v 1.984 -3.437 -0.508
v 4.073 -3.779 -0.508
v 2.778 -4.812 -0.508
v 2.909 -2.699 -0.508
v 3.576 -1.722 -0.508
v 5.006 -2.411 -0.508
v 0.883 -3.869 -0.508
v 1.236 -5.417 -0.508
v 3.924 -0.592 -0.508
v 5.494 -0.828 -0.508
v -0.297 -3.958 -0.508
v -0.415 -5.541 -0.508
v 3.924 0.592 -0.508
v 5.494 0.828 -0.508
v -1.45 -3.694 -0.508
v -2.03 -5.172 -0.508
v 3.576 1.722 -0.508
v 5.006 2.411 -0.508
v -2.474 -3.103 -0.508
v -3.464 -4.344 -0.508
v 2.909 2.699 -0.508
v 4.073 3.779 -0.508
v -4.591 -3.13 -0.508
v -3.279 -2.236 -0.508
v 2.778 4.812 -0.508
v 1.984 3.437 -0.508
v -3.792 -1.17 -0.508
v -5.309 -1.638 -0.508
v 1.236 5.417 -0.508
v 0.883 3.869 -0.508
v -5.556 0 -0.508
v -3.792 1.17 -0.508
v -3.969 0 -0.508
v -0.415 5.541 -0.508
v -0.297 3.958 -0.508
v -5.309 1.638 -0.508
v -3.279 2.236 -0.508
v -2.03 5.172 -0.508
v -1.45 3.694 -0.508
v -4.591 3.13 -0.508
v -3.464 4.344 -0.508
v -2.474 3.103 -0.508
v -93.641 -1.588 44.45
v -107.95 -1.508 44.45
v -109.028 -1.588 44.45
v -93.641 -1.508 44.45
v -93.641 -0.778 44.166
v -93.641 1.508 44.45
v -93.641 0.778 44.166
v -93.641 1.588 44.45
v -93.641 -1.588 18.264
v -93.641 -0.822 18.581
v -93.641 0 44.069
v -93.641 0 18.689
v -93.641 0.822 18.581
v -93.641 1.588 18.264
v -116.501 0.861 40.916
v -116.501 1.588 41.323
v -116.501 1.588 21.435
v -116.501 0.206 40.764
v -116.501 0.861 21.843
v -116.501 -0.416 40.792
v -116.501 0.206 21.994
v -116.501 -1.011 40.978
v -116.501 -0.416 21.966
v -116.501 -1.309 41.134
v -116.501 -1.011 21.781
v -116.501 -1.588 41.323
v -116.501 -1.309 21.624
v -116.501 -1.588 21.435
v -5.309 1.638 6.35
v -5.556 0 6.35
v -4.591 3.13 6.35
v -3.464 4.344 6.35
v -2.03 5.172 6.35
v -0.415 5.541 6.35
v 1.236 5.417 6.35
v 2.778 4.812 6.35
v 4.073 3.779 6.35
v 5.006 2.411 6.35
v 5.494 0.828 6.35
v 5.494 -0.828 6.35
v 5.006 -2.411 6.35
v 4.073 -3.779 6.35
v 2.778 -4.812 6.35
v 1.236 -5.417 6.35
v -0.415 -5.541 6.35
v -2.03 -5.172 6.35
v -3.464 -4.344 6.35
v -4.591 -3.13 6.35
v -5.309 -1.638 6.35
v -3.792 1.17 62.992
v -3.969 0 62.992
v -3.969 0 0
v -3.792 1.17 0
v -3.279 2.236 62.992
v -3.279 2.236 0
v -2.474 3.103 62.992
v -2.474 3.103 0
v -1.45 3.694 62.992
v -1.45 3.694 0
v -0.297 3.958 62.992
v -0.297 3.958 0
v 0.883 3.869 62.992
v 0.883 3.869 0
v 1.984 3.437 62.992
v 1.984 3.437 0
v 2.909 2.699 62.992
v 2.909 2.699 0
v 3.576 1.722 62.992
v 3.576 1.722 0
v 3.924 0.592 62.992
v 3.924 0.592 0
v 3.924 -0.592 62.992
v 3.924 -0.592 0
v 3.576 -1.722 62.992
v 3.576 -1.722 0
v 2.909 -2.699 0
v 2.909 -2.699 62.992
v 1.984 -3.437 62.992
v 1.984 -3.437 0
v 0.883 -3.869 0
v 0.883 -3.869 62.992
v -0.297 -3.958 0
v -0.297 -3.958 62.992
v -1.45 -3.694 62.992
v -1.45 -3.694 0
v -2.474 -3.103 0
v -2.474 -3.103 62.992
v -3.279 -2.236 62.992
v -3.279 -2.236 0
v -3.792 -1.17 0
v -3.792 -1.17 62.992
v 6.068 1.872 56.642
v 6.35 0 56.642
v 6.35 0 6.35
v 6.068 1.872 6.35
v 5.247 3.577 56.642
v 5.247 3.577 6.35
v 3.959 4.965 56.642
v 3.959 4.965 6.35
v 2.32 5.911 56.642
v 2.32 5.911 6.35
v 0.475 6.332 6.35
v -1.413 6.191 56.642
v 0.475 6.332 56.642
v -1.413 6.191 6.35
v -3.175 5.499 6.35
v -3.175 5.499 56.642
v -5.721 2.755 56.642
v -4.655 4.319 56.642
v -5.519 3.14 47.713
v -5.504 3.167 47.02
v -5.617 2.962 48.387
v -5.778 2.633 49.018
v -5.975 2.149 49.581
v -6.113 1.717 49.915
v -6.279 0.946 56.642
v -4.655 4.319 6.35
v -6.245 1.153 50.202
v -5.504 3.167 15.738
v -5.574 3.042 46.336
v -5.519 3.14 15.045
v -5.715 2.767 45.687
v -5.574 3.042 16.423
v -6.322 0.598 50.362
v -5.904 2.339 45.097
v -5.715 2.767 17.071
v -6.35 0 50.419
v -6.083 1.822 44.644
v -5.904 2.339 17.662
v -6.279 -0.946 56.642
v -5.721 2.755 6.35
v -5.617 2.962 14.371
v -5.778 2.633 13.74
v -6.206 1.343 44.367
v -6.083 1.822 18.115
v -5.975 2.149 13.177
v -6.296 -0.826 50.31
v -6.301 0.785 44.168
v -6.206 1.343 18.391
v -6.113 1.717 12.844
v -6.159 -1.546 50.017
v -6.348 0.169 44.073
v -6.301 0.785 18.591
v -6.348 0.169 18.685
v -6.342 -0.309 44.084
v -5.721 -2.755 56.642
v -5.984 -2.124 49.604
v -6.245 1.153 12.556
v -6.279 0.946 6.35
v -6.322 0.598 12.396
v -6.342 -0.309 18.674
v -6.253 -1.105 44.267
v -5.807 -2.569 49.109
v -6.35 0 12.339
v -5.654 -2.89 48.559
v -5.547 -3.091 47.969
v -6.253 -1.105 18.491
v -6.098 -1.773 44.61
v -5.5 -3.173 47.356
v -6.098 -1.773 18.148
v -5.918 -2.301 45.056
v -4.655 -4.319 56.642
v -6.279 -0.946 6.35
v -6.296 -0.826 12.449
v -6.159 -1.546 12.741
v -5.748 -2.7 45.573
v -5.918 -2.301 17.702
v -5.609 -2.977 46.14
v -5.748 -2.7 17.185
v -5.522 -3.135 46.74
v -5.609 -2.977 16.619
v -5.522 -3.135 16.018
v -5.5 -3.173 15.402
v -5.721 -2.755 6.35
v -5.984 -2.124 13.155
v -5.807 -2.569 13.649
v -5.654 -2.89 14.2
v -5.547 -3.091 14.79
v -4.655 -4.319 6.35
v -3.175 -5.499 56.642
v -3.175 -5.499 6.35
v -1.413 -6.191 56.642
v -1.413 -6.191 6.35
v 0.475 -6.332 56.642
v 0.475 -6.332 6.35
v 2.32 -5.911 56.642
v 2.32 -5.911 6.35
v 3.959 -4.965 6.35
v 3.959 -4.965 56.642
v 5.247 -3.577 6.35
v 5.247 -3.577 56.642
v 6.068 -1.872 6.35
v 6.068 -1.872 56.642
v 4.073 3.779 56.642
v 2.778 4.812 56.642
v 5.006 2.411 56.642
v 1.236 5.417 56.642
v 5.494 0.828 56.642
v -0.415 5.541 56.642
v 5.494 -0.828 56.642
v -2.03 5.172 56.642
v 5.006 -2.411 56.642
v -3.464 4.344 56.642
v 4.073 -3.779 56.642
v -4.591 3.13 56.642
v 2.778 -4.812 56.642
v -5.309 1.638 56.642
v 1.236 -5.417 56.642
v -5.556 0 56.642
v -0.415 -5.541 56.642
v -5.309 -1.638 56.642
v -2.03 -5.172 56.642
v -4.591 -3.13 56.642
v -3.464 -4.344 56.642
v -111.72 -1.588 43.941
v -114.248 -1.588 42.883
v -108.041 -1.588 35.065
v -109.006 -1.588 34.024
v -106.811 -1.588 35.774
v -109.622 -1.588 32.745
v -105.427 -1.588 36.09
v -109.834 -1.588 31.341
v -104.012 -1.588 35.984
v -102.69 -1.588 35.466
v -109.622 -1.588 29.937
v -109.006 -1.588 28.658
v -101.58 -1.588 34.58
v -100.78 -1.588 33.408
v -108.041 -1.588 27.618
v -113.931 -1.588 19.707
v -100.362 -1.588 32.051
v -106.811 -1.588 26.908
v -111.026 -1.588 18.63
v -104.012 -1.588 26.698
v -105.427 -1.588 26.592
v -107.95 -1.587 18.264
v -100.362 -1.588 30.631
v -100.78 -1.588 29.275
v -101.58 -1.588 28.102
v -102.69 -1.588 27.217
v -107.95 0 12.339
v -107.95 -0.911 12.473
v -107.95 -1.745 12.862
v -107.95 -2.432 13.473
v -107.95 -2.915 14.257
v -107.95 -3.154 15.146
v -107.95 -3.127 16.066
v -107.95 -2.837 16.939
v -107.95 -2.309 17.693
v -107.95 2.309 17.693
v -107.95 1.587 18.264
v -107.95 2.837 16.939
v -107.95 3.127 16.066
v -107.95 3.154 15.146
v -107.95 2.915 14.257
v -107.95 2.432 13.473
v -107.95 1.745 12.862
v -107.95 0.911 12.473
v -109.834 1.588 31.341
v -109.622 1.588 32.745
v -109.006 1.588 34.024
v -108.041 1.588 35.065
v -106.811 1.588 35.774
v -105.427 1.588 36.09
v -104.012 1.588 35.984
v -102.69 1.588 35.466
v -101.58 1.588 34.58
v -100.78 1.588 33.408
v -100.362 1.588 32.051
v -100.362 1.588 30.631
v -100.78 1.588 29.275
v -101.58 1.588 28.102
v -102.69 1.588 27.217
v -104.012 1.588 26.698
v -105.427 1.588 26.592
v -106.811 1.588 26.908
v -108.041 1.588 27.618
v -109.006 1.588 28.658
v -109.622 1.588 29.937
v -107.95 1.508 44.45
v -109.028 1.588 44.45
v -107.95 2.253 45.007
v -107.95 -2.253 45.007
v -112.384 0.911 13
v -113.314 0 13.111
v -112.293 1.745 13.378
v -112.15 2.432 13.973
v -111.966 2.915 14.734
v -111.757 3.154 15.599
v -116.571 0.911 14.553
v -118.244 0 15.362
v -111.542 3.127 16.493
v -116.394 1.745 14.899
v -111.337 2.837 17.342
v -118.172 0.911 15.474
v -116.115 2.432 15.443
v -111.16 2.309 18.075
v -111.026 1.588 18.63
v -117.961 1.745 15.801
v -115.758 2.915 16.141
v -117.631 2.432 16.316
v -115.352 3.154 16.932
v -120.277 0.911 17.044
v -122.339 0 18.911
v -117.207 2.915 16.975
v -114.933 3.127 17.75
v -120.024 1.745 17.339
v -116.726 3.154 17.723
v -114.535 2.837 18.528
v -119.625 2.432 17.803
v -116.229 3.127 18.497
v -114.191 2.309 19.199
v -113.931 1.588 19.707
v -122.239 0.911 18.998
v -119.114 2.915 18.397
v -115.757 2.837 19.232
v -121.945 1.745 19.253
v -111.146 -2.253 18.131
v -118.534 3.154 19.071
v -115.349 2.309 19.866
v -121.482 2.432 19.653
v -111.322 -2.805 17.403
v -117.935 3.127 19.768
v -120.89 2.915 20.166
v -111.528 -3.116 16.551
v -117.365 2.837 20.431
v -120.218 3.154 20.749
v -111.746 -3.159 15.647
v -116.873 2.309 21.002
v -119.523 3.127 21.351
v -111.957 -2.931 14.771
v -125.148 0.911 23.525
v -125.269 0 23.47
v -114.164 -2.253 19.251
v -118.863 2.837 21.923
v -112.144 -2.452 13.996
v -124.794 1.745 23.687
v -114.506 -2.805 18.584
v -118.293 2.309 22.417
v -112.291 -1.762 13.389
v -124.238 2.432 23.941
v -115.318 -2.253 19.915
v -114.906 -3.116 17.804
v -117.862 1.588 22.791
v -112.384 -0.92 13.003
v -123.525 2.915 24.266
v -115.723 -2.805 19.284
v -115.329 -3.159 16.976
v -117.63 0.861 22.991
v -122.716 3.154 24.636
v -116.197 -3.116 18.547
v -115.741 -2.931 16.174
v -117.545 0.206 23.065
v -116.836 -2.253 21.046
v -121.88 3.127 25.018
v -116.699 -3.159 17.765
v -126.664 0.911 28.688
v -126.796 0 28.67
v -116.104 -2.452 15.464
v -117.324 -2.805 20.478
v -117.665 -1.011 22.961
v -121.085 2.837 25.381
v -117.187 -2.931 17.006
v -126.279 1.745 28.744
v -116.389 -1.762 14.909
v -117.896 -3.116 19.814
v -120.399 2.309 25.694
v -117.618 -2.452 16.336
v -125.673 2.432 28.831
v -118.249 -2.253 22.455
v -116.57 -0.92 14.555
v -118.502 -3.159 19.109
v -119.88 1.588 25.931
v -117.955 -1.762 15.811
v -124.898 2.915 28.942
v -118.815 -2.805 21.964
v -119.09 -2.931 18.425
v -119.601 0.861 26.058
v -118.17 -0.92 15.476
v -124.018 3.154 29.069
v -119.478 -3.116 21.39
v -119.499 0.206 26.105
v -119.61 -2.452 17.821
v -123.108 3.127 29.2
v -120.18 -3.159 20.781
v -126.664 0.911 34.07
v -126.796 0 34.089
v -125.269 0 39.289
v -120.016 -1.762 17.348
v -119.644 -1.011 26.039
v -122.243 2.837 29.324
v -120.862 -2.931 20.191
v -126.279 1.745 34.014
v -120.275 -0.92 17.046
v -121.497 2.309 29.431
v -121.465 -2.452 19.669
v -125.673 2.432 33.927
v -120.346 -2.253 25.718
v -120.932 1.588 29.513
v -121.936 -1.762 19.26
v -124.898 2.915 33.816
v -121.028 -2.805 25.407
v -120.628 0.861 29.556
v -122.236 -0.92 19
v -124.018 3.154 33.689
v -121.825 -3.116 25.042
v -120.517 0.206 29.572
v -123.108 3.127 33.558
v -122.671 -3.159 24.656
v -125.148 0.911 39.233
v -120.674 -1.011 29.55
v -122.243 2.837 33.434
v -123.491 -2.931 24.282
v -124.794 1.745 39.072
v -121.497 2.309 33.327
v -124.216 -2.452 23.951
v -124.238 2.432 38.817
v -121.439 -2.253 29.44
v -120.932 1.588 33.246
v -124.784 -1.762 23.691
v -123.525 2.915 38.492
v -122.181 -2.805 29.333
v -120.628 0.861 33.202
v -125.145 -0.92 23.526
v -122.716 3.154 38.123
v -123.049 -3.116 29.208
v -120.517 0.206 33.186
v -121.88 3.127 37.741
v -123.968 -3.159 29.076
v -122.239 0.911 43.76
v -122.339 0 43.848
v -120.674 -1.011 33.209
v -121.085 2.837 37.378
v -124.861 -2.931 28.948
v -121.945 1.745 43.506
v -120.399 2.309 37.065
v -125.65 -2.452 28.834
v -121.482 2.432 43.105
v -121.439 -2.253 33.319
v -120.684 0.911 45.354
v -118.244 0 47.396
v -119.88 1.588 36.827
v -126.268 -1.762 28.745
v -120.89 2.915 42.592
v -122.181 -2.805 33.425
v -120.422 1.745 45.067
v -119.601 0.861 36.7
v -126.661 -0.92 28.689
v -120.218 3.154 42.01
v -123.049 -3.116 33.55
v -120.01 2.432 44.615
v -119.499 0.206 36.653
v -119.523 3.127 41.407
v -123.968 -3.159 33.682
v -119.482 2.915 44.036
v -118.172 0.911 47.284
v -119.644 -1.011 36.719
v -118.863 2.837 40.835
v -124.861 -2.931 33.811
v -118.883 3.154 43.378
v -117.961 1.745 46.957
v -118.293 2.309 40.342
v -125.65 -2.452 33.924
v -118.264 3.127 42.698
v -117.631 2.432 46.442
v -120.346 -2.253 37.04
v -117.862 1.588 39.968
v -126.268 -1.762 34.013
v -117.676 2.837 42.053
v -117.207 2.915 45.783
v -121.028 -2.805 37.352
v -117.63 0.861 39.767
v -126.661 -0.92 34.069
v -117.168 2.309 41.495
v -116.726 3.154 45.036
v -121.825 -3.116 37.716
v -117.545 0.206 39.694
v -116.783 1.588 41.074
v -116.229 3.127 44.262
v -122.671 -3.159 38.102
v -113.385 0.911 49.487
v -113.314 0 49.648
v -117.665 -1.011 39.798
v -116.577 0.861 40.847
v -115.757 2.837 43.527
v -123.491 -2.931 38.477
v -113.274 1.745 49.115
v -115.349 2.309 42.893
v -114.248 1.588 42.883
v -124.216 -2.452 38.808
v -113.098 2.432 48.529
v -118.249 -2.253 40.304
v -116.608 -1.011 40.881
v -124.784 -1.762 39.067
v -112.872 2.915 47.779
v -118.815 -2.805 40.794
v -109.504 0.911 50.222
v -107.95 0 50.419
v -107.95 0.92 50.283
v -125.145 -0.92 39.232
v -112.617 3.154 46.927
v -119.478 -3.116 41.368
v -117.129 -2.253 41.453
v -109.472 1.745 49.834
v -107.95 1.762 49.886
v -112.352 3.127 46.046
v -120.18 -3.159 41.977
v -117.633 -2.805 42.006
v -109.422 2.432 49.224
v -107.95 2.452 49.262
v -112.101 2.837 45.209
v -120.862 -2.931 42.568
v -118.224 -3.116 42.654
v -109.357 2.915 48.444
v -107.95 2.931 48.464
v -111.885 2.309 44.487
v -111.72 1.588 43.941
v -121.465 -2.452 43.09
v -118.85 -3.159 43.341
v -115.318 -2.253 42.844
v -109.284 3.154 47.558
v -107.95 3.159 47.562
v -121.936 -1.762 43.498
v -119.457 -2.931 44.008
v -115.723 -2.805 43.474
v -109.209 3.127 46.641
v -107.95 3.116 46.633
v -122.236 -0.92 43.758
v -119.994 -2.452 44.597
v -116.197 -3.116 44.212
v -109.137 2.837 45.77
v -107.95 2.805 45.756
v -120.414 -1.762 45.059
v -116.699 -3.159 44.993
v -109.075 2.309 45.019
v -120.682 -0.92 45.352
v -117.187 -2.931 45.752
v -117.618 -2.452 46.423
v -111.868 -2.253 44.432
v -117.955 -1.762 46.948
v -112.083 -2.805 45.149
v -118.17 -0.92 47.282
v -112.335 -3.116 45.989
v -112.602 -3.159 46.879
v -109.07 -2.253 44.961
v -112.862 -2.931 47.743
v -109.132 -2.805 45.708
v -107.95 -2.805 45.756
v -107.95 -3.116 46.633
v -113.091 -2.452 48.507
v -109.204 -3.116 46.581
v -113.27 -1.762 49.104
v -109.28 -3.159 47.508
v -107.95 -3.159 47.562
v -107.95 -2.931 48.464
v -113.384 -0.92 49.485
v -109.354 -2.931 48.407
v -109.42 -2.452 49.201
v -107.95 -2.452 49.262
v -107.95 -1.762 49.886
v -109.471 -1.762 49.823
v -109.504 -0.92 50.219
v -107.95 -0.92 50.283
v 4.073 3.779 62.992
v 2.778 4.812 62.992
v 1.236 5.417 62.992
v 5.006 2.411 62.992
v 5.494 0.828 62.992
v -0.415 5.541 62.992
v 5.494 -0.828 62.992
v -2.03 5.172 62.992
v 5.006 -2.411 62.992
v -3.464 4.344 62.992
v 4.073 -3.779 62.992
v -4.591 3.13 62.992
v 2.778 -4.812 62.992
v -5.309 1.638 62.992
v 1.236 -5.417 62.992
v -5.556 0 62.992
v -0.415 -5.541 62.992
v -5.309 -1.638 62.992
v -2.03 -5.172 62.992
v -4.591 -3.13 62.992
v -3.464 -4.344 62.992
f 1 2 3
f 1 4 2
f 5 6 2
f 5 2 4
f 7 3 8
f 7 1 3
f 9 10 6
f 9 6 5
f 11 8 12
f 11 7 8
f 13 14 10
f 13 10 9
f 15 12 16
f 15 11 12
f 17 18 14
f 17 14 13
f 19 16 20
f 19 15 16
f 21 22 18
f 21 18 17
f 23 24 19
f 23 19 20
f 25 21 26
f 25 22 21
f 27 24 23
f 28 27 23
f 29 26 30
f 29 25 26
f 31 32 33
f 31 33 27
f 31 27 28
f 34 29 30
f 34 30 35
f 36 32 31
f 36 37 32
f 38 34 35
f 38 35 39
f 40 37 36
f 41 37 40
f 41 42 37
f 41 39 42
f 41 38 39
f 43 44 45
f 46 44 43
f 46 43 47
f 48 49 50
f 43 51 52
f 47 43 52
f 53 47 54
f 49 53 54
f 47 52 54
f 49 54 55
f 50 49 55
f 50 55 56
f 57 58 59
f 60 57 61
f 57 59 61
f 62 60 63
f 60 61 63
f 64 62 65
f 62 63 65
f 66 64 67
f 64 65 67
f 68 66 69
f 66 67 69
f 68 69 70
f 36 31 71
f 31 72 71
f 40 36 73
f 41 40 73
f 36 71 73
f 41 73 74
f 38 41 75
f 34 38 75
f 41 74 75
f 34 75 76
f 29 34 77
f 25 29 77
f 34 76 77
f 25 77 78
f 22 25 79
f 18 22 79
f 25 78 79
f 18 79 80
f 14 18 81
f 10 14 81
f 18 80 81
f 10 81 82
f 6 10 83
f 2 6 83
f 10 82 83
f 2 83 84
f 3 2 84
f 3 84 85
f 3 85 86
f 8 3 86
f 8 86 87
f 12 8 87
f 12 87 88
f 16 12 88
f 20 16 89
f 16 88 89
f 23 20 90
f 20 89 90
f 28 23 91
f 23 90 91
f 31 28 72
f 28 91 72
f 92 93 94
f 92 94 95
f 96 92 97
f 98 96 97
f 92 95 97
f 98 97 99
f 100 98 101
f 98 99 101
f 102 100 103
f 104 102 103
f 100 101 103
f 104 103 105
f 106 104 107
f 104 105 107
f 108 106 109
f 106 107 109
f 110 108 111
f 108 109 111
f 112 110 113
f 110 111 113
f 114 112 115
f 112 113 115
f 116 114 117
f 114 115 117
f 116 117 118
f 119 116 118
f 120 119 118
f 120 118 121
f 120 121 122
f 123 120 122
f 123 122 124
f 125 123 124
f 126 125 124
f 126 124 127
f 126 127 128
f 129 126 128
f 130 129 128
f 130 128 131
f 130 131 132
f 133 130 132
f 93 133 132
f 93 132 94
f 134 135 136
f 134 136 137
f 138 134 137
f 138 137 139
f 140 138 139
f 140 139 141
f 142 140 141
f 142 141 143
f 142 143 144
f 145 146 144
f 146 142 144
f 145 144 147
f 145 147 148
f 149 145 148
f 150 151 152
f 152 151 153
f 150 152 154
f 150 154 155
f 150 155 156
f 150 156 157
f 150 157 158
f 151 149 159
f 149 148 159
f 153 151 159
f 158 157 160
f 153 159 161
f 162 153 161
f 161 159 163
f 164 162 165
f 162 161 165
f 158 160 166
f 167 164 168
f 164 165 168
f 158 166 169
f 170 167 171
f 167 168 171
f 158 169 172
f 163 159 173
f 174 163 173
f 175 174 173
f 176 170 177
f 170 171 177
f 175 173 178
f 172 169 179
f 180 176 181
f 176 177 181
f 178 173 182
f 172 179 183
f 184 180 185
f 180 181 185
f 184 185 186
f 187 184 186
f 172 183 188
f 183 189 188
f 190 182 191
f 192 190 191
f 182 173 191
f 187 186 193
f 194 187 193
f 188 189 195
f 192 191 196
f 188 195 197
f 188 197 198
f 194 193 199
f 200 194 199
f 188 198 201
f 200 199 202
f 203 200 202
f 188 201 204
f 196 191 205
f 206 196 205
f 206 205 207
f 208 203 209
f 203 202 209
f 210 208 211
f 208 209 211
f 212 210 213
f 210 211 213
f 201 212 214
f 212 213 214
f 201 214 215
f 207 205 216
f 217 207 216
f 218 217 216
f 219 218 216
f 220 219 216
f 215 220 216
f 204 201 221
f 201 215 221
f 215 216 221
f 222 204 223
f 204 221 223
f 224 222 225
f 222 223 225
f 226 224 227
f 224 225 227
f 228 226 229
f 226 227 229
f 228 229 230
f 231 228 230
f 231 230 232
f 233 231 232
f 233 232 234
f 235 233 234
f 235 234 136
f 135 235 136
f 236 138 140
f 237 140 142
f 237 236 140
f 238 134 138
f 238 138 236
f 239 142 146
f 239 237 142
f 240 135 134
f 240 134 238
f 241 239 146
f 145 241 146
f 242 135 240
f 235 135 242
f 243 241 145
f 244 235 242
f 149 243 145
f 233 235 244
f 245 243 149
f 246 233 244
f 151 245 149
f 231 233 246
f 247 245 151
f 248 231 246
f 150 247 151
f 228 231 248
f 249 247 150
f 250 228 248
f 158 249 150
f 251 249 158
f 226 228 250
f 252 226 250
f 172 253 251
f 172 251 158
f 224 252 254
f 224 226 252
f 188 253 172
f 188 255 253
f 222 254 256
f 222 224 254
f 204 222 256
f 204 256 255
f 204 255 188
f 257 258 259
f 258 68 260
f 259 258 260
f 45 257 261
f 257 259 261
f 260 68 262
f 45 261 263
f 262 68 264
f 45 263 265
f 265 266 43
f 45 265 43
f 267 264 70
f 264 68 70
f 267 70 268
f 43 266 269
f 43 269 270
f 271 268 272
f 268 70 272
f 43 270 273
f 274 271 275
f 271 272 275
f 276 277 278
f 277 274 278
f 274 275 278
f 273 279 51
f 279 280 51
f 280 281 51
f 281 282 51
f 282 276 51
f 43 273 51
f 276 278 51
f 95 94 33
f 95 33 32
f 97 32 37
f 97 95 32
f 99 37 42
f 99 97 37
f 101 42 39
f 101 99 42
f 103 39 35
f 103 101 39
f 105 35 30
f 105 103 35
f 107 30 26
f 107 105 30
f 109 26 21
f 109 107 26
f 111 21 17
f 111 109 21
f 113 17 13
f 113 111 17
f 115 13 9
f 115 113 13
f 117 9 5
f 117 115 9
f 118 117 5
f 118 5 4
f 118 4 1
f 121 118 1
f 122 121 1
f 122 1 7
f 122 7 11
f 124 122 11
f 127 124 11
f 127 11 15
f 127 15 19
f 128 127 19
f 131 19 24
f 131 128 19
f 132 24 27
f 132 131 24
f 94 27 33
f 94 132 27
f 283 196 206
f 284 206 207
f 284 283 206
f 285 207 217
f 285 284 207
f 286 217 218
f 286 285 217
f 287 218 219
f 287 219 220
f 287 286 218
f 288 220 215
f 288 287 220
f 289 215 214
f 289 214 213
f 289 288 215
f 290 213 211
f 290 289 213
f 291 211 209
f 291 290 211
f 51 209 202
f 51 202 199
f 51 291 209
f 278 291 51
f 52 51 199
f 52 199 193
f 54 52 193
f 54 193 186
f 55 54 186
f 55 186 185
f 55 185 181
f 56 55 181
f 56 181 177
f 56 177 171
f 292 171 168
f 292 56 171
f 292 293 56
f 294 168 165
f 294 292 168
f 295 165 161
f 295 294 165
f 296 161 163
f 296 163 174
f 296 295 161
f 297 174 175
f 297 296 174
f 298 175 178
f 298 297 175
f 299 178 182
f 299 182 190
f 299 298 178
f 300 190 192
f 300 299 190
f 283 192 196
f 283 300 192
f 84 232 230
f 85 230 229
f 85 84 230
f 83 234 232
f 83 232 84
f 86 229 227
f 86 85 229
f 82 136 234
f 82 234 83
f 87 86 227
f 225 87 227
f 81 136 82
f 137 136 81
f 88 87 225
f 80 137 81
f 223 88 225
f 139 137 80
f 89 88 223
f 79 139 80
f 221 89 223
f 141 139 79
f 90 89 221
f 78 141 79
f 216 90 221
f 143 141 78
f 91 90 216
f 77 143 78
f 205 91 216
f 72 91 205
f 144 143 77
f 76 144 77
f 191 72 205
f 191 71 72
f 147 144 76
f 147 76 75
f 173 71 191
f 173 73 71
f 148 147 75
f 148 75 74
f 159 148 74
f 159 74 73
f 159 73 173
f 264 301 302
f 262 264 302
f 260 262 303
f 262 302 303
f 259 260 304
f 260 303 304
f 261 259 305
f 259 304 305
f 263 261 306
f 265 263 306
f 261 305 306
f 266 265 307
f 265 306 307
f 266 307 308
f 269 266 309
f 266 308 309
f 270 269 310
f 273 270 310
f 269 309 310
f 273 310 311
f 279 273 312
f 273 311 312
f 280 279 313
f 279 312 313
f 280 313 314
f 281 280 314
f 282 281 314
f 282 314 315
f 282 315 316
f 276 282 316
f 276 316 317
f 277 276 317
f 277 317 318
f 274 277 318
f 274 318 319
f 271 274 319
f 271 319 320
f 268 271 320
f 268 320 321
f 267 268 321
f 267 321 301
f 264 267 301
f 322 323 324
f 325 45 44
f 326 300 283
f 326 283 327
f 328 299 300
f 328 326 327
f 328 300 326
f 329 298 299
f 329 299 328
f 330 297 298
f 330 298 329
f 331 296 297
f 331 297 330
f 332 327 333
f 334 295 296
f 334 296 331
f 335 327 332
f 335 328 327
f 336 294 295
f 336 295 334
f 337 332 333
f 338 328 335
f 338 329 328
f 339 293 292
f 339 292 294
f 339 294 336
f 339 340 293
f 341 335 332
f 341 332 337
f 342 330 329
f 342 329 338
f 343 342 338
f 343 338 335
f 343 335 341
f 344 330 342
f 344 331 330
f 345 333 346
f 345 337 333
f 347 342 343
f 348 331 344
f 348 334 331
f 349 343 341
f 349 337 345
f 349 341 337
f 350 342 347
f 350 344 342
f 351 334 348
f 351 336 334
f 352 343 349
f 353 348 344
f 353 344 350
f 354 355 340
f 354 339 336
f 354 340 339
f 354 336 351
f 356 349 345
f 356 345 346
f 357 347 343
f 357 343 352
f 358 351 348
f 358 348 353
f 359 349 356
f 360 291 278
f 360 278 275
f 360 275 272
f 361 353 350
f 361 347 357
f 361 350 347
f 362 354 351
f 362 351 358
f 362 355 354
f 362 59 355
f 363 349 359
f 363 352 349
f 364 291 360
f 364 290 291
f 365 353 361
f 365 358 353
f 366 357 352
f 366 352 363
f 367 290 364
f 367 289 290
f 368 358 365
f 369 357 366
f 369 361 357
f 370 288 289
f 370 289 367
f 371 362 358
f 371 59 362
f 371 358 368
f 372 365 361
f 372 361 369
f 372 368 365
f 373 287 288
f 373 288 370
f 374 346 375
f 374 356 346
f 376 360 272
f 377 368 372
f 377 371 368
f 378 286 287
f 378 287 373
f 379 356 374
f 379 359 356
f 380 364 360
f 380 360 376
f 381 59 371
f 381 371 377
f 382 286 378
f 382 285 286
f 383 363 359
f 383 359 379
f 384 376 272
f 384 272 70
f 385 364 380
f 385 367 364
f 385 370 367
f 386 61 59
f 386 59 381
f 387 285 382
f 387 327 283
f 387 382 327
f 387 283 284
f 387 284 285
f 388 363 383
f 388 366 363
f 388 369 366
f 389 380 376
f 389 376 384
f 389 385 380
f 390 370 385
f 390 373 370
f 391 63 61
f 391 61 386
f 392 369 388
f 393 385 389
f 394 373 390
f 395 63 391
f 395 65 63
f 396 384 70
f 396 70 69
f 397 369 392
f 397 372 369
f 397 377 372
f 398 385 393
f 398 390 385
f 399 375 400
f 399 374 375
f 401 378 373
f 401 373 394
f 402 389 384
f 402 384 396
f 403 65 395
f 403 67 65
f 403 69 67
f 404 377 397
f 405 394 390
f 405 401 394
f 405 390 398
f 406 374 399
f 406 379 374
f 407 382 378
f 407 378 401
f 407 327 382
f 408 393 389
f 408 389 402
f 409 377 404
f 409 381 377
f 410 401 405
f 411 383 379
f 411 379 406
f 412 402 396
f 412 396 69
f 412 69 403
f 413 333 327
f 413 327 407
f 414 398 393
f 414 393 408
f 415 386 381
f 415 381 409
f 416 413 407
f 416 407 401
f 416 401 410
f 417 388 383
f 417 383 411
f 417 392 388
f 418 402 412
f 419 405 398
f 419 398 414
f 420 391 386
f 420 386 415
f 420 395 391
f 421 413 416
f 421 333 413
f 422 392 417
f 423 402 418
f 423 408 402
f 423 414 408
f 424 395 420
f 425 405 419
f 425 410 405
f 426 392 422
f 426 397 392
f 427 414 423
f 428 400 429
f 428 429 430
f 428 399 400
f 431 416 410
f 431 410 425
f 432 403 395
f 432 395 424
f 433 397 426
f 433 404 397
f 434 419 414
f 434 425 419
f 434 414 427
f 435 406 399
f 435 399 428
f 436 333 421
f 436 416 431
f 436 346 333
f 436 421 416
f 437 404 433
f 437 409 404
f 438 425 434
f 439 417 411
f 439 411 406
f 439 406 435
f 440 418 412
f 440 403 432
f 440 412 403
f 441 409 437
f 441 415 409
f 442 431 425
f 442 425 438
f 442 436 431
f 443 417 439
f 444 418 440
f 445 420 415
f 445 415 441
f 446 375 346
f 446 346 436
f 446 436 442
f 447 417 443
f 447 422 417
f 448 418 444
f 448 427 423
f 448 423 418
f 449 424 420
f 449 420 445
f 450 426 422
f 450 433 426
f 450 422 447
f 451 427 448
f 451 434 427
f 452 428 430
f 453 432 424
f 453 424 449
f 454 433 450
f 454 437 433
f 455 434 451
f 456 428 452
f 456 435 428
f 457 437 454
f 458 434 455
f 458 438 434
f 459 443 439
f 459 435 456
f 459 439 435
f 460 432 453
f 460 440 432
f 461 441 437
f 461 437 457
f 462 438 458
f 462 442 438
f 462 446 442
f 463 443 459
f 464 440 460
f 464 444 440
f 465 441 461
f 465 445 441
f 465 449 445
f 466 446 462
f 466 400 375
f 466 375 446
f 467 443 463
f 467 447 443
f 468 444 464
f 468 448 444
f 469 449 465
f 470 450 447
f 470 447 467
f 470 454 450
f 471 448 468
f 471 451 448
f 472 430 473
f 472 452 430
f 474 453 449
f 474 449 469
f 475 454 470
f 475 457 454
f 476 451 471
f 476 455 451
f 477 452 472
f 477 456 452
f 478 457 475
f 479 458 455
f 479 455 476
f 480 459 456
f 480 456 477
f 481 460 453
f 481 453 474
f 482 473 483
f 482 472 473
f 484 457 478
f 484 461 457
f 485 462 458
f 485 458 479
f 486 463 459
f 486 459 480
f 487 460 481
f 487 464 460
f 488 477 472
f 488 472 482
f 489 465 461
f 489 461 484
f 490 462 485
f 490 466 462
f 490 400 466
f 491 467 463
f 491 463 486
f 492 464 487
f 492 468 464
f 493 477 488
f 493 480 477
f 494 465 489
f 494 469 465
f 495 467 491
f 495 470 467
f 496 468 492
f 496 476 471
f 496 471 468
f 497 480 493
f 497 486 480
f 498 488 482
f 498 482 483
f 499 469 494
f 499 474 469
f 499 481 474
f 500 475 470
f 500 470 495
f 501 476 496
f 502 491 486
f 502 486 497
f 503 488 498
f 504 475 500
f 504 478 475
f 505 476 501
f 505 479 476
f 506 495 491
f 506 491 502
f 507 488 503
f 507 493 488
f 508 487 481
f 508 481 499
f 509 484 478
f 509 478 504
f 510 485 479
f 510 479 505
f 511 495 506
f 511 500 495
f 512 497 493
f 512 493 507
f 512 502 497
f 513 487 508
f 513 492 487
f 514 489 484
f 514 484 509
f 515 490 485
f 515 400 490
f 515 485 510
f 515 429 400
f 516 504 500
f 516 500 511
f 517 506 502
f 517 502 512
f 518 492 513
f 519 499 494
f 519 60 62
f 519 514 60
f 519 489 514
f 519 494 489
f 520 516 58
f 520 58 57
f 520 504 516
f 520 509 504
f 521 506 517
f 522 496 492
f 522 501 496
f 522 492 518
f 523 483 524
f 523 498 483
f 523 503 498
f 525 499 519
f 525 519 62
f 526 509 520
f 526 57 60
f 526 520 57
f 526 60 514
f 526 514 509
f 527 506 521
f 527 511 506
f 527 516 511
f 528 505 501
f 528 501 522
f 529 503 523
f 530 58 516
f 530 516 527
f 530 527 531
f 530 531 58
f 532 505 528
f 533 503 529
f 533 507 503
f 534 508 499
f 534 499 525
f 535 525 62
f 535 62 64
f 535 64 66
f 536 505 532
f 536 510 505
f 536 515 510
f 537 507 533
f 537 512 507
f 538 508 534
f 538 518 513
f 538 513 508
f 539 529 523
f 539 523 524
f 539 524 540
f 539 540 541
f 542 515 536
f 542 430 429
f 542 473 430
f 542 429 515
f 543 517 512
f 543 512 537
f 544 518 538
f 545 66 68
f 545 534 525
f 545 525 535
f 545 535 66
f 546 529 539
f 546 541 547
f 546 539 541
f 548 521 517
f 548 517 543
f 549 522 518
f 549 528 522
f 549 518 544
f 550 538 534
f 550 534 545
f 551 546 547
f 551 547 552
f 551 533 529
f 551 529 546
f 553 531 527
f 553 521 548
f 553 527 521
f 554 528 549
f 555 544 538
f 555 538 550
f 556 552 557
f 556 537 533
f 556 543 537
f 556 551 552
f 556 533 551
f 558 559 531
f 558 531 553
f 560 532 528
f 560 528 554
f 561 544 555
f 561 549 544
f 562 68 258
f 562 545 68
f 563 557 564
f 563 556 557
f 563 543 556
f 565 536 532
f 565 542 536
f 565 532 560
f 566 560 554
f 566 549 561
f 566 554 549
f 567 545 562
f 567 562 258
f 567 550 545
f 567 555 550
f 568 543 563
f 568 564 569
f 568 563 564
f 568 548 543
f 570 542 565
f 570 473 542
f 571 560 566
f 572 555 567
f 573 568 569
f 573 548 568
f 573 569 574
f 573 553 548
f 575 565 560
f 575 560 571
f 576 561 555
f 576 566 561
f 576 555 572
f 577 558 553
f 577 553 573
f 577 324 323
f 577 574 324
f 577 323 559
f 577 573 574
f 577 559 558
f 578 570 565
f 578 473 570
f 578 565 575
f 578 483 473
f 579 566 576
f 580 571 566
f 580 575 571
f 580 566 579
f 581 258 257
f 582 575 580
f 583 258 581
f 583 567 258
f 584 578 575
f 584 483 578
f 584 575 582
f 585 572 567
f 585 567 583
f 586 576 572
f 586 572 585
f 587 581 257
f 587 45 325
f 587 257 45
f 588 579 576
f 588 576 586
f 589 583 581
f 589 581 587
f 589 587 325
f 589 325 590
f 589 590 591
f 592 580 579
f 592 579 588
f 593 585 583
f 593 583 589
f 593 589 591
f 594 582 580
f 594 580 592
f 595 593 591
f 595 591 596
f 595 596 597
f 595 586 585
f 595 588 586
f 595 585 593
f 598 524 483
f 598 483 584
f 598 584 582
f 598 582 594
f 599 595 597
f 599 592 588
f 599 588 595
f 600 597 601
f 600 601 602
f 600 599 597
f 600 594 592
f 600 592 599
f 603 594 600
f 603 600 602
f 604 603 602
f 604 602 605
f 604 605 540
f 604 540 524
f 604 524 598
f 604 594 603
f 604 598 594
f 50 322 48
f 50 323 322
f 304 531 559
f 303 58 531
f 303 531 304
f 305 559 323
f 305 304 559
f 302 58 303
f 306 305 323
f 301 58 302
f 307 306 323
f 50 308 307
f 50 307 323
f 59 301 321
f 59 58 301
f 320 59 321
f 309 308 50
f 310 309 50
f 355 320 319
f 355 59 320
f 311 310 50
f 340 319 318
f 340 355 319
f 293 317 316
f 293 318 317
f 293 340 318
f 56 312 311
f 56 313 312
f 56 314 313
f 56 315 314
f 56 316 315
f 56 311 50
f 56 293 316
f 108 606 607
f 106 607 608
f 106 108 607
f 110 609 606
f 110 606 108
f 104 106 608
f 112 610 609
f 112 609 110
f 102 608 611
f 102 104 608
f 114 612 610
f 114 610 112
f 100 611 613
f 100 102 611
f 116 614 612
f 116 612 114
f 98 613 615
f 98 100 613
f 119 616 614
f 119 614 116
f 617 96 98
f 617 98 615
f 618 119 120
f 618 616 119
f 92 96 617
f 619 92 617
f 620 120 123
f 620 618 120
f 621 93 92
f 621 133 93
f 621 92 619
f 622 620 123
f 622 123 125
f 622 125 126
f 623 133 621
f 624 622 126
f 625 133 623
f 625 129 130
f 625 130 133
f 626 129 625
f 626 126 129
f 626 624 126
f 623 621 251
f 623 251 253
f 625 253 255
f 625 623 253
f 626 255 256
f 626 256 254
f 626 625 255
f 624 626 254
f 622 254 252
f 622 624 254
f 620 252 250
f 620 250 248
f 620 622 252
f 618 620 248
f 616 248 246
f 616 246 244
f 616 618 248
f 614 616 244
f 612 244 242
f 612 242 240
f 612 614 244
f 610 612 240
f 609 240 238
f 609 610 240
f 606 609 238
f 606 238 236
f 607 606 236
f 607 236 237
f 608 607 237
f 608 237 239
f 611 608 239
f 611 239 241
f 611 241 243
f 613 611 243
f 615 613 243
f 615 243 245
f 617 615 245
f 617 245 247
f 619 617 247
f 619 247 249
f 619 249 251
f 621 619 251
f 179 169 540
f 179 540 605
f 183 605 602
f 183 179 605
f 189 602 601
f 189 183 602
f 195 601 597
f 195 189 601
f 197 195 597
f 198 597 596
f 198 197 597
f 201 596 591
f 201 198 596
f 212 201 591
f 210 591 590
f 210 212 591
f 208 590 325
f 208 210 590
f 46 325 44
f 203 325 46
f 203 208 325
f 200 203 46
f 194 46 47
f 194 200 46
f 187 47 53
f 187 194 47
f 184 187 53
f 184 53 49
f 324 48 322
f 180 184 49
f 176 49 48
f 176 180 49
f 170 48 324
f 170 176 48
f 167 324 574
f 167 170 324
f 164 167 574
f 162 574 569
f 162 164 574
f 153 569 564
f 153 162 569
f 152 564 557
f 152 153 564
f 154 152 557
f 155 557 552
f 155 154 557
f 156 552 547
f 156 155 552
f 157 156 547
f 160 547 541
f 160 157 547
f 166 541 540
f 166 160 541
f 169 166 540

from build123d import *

# Parameters (mm, degrees)
SKETCH1_R           = 6.35
SKETCH1_R_2         = 3.175
BOSS_EXTRUDE1_DEPTH = 62.992
SKETCH3_R           = 3.175
SKETCH6_W           = 22.86
SKETCH6_H           = 1.5875
BOSS_EXTRUDE3_DEPTH = 29.21
SKETCH7_R           = 4.7625
CUT_EXTRUDE1_DEPTH  = 29.21
SKETCH9_R           = 6.35
SKETCH9_R_2         = 3.175
BOSS_EXTRUDE5_DEPTH = 6.35
SKETCH10_R          = 6.35
SKETCH10_R_2        = 5.55625
CUT_EXTRUDE6_DEPTH  = 12.7
SKETCH12_R          = 6.35
SKETCH12_R_2        = 5.55625
CUT_EXTRUDE7_DEPTH  = 12.7
SKETCH13_R          = 5.55625
SKETCH13_R_2        = 3.175
CUT_EXTRUDE8_DEPTH  = 6.35
SKETCH14_R          = 5.55625
SKETCH14_R_2        = 3.175
CUT_EXTRUDE9_DEPTH  = 6.35
SKETCH16_R          = 3.96875
CUT_EXTRUDE11_DEPTH = 142.896915114
SKETCH18_R          = 5.55625
SKETCH18_R_2        = 3.96875
BOSS_EXTRUDE7_DEPTH = 0.508


with BuildPart() as part:
    # Sketch1 → Boss-Extrude1 (new body)
    with BuildSketch(Plane.XY):
        Circle(SKETCH1_R)
        Circle(SKETCH1_R_2, mode=Mode.SUBTRACT)
    extrude(amount=BOSS_EXTRUDE1_DEPTH)

    # Sweep1: sweep along a path in Sketch4
    with BuildLine(Plane(origin=(0, 0, 0), x_dir=(1, 0, 0), z_dir=(0, 1, 0))) as sweep1_path:
        Line((-3.81, -15.663931971), (-107.95, -15.663931971))
        ThreePointArc((-107.95, -15.663931971), (-123.665226198, -31.37915817), (-107.95, -47.094384368))
        Line((-107.95, -47.094384368), (-3.81, -47.094384368))
    # Sketch3 → Sweep1 (sweep)
    with BuildSketch(Plane.ZY.offset(3.81)):
        with Locations((47.244, 0)):
            Circle(SKETCH3_R)
    sweep(path=sweep1_path.line)

    # Sketch6 → Boss-Extrude3 (add)
    with BuildSketch(Plane.XY.offset(15.24)):
        with Locations((-105.071320577, -0.79375)):
            Rectangle(SKETCH6_W, SKETCH6_H)
        with Locations((-105.071320577, 0.79375)):
            Rectangle(SKETCH6_W, SKETCH6_H)
    extrude(amount=BOSS_EXTRUDE3_DEPTH)

    # Sketch7 → Cut-Extrude1 (cut)
    with BuildSketch(Plane(origin=(0, 1.5875, 0), x_dir=(1, 0, 0), z_dir=(0, 1, 0))):
        with Locations(Location((-105.071320577, -31.341130791, 0), (0, 0, 180))):
            Circle(SKETCH7_R)
    extrude(amount=-CUT_EXTRUDE1_DEPTH, mode=Mode.SUBTRACT)

    # Sketch9 → Boss-Extrude5 (add)
    with BuildSketch(Plane(origin=(0, 0, 0), x_dir=(-1, 0, 0), z_dir=(0, 0, -1))):
        Circle(SKETCH9_R)
        Circle(SKETCH9_R_2, mode=Mode.SUBTRACT)
    boss_extrude5 = extrude(amount=BOSS_EXTRUDE5_DEPTH)

    # Mirror1: Boss-Extrude5 across plane
    add(boss_extrude5.mirror(Plane.XY.offset(31.496)))

    # Sketch10 → Cut-Extrude6 (cut)
    with BuildSketch(Plane.XY.offset(69.342)):
        with Locations(Location((0, 0, 0), (0, 0, 180))):
            Circle(SKETCH10_R)
        with Locations(Location((0, 0, 0), (0, 0, 180))):
            Circle(SKETCH10_R_2, mode=Mode.SUBTRACT)
    extrude(amount=-CUT_EXTRUDE6_DEPTH, mode=Mode.SUBTRACT)

    # Sketch12 → Cut-Extrude7 (cut)
    with BuildSketch(Plane(origin=(0, 0, -6.35), x_dir=(-1, 0, 0), z_dir=(0, 0, -1))):
        Circle(SKETCH12_R)
        Circle(SKETCH12_R_2, mode=Mode.SUBTRACT)
    extrude(amount=-CUT_EXTRUDE7_DEPTH, mode=Mode.SUBTRACT)

    # Sketch13 → Cut-Extrude8 (cut)
    with BuildSketch(Plane.XY.offset(69.342)):
        with Locations(Location((0, 0, 0), (0, 0, 180))):
            Circle(SKETCH13_R)
        Circle(SKETCH13_R_2, mode=Mode.SUBTRACT)
    extrude(amount=-CUT_EXTRUDE8_DEPTH, mode=Mode.SUBTRACT)

    # Sketch14 → Cut-Extrude9 (cut)
    with BuildSketch(Plane(origin=(0, 0, -6.35), x_dir=(-1, 0, 0), z_dir=(0, 0, -1))):
        Circle(SKETCH14_R)
        Circle(SKETCH14_R_2, mode=Mode.SUBTRACT)
    extrude(amount=-CUT_EXTRUDE9_DEPTH, mode=Mode.SUBTRACT)

    # Sketch16 → Cut-Extrude11 (cut, through all)
    with BuildSketch(Plane(origin=(0, 0, 0), x_dir=(-1, 0, 0), z_dir=(0, 0, -1))):
        Circle(SKETCH16_R)
    extrude(amount=-CUT_EXTRUDE11_DEPTH, mode=Mode.SUBTRACT)

    # Sketch18 → Boss-Extrude7 (add)
    with BuildSketch(Plane(origin=(0, 0, 0), x_dir=(-1, 0, 0), z_dir=(0, 0, -1))):
        Circle(SKETCH18_R)
        Circle(SKETCH18_R_2, mode=Mode.SUBTRACT)
    extrude(amount=BOSS_EXTRUDE7_DEPTH)


solid = part.part
